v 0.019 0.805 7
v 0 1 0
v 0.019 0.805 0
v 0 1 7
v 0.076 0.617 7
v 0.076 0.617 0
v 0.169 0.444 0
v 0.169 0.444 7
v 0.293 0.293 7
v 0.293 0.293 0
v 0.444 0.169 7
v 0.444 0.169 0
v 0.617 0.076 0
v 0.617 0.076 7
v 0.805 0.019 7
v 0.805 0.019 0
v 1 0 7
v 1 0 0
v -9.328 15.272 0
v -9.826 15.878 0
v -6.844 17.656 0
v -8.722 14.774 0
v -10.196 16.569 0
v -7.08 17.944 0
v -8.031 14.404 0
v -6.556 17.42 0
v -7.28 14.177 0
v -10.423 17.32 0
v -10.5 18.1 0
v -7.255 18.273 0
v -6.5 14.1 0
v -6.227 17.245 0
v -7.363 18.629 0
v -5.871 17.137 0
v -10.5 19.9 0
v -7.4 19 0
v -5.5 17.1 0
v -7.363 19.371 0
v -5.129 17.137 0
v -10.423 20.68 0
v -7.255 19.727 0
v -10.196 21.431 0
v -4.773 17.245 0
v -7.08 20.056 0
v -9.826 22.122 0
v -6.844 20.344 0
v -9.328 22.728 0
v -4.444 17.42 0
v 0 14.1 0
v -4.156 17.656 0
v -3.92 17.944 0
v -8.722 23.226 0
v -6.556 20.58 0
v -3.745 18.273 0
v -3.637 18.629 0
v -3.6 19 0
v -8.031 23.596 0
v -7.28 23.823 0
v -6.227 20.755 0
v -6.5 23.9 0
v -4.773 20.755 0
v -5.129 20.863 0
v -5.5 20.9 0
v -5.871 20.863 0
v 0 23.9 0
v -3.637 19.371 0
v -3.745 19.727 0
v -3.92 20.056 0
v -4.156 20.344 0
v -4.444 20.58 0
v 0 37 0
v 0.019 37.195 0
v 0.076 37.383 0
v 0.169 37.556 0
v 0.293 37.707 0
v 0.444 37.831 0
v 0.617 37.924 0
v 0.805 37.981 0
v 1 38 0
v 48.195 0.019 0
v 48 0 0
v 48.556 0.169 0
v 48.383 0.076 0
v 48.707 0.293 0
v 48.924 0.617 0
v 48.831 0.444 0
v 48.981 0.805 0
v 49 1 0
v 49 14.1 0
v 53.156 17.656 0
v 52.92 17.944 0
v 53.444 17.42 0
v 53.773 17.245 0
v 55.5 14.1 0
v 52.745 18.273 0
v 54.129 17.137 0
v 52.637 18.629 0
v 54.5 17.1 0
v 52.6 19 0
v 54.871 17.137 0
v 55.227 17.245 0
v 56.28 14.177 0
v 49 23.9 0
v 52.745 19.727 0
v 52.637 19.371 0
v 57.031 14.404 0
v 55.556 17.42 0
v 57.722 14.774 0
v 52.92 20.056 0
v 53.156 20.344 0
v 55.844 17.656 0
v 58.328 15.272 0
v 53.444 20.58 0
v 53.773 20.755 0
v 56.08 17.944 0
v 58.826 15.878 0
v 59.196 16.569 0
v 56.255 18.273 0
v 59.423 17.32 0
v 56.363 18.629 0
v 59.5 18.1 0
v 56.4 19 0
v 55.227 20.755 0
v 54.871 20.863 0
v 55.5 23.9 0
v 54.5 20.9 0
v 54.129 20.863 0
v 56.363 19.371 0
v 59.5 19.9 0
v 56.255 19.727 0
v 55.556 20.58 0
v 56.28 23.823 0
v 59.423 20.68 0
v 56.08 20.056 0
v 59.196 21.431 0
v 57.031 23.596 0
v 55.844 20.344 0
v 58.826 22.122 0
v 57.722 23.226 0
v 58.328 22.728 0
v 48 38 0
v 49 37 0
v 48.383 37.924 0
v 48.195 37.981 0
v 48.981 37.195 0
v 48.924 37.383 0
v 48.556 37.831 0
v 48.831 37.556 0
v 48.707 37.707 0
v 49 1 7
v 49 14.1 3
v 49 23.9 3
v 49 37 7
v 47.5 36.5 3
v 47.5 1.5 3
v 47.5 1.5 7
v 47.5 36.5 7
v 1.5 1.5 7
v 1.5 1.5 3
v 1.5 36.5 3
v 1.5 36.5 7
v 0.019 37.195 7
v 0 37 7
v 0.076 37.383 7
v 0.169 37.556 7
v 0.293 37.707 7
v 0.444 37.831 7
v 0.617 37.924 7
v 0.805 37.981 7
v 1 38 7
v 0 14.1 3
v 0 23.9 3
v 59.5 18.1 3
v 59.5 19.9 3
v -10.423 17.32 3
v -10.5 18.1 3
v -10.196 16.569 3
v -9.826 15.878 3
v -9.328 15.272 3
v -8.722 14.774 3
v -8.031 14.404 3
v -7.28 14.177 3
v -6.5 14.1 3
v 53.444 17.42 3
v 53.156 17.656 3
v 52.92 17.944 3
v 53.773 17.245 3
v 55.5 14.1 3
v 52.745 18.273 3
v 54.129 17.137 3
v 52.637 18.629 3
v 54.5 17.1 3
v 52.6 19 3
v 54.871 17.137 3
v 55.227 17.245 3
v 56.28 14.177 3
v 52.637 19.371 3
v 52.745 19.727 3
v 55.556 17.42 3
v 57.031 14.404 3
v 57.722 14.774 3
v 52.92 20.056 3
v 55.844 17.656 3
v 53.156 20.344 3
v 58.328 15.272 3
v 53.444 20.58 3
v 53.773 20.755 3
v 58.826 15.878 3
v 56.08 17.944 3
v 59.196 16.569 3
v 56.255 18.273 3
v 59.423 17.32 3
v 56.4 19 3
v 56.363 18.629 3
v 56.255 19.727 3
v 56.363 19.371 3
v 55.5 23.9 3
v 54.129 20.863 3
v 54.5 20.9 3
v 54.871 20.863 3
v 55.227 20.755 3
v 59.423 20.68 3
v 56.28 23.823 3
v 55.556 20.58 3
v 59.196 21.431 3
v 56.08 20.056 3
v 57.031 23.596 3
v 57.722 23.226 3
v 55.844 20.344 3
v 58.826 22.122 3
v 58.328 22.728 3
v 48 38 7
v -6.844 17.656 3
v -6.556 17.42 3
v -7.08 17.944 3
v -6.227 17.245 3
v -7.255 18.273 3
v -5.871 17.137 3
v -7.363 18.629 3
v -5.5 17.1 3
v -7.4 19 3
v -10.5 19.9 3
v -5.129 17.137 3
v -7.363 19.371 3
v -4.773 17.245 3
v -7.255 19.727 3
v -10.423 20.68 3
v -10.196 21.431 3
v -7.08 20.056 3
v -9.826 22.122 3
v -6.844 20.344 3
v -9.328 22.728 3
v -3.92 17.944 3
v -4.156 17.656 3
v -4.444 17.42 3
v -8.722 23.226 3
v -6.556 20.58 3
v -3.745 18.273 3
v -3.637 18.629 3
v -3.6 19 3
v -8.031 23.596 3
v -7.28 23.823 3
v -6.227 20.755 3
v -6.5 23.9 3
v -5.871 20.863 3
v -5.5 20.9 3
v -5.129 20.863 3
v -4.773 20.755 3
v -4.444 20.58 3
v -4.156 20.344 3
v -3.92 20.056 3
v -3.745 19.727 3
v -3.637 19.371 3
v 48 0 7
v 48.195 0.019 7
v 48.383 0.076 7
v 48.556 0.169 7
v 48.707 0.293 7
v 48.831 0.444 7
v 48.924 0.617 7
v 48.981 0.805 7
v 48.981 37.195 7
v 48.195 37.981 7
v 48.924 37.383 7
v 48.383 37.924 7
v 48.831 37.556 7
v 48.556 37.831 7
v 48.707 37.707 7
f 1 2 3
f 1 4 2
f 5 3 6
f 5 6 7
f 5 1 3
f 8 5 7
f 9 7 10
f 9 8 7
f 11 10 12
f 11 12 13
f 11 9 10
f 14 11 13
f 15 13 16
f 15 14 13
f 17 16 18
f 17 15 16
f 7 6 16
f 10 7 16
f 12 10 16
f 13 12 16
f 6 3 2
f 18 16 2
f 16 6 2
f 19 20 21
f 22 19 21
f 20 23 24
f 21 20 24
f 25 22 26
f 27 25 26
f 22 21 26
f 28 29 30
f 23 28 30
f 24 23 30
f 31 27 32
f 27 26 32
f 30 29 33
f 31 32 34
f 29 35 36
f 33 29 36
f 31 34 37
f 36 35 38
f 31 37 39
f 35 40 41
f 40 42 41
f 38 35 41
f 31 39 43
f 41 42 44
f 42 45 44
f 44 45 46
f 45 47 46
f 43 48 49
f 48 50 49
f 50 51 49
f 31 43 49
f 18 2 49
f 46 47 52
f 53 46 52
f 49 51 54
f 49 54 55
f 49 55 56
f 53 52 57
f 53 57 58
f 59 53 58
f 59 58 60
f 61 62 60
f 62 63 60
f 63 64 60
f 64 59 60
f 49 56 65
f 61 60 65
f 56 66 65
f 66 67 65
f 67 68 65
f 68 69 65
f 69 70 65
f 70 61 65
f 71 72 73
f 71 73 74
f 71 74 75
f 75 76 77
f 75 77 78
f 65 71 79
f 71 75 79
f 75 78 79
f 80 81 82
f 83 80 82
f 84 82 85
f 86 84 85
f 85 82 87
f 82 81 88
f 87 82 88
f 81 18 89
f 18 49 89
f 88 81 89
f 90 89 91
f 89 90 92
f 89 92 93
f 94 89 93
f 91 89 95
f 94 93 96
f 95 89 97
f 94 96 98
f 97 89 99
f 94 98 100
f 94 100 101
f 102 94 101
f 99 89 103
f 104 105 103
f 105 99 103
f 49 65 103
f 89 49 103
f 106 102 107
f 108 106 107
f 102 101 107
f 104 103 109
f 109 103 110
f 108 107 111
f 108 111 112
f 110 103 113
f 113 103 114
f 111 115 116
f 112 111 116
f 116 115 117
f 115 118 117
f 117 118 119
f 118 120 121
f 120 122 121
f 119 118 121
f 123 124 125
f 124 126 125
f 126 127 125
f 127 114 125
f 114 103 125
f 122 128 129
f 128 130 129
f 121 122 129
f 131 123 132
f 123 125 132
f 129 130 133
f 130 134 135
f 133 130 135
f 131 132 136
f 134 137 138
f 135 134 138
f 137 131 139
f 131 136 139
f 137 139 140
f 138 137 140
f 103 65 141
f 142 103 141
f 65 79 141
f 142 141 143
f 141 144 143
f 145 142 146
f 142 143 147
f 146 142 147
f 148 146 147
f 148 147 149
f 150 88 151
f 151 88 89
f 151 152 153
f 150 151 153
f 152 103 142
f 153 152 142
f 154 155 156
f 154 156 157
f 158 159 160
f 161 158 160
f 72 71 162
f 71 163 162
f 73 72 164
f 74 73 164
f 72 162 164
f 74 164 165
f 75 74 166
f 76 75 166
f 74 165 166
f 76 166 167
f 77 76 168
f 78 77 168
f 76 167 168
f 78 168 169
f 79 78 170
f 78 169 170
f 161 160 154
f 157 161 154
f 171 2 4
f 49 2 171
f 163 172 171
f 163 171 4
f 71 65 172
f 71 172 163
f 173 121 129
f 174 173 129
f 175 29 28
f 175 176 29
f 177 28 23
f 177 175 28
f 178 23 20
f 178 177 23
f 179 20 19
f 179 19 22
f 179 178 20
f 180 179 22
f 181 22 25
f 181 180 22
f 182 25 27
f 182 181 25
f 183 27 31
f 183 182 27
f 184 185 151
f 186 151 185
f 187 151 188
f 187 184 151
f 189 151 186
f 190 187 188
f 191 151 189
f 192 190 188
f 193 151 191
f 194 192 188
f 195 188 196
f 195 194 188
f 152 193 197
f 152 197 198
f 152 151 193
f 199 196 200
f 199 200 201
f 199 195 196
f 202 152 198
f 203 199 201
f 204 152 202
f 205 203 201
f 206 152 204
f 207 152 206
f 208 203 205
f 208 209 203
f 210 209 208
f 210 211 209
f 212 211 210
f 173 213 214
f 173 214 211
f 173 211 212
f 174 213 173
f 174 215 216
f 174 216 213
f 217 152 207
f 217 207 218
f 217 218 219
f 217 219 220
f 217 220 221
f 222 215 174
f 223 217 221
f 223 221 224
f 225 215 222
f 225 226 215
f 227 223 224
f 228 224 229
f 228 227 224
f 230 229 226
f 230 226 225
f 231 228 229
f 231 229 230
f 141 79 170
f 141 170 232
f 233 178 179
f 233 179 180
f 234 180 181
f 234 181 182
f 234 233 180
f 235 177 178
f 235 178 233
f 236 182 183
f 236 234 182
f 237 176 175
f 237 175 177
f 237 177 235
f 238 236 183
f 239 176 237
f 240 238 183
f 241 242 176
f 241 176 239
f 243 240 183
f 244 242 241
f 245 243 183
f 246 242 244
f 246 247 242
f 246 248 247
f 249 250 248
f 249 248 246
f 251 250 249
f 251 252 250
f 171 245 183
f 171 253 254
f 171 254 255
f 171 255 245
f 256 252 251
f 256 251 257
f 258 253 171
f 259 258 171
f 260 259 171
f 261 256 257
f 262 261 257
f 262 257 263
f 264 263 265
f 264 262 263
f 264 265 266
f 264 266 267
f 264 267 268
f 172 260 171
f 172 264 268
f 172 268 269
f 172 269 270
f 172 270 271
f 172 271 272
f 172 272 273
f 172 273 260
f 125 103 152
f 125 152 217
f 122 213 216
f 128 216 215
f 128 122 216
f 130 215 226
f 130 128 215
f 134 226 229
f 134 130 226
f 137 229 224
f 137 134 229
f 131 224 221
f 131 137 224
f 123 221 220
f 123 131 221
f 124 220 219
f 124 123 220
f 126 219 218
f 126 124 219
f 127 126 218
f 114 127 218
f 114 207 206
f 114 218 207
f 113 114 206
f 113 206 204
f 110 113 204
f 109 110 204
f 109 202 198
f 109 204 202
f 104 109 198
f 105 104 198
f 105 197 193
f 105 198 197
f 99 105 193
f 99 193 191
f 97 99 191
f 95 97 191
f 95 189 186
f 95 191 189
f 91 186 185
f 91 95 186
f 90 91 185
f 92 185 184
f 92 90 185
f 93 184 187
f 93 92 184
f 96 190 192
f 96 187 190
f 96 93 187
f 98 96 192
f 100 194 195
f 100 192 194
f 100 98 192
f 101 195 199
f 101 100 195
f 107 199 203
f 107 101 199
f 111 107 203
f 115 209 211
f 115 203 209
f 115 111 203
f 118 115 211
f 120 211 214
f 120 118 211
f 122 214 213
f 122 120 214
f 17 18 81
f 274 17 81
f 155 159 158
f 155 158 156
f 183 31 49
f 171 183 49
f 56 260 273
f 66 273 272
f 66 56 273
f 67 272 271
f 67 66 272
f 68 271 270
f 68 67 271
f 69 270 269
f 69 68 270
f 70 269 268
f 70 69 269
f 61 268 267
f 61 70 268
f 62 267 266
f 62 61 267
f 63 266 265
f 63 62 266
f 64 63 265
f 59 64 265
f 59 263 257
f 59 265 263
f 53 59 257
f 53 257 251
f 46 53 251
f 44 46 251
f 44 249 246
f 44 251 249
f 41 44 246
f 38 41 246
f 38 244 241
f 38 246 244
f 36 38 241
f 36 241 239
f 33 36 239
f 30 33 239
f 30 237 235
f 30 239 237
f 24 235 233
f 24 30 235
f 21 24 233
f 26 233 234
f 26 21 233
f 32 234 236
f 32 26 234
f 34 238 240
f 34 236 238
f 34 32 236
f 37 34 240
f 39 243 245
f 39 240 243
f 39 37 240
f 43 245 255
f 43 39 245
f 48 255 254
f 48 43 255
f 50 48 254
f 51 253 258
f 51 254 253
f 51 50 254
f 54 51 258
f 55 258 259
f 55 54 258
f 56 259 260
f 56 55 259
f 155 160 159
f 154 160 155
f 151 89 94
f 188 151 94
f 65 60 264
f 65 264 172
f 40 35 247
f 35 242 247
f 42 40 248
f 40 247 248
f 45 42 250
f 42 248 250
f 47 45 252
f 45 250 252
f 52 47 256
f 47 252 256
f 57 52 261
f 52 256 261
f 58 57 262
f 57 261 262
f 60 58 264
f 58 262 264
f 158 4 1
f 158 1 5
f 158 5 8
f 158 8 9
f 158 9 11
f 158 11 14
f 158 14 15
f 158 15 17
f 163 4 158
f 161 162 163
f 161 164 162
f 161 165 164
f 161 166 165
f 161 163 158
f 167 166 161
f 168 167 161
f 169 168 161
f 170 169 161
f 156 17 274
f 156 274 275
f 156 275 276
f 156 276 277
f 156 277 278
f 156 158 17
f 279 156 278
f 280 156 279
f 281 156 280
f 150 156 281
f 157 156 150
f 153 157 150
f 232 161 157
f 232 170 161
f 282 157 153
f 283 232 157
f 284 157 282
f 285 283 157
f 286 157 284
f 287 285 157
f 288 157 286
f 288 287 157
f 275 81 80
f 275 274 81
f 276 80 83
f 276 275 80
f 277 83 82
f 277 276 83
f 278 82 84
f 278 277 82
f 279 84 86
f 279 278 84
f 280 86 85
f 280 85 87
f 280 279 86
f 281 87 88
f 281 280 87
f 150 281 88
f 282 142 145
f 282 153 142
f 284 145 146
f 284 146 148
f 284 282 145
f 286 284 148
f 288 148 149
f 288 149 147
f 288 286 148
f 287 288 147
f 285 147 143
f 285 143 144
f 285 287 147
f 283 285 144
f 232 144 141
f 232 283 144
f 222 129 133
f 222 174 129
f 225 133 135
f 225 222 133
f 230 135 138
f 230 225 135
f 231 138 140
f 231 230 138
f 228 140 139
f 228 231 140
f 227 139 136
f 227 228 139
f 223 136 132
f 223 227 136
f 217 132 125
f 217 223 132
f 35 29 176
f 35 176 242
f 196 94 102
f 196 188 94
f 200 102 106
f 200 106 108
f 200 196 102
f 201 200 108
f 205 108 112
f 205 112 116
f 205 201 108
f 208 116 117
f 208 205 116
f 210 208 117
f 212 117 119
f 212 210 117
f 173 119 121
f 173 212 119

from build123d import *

# Parameters (mm, degrees)
BOX001_W          = 46
BOX001_H          = 35
BOX001_DEPTH      = 4
BOX_W             = 49
BOX_H             = 38
BOX_DEPTH         = 7
FILLET_R          = 1
CYLINDER001_R     = 1.9
CYLINDER001_DEPTH = 10
ARRAY002_X_COUNT  = 2
ARRAY002_X_PITCH  = 60
BOX005_W          = 70
BOX005_H          = 9.8
BOX005_DEPTH      = 3
FILLET002_R       = 4


with BuildPart() as internal_cube:
    # Box001 → Box001 (new body)
    with BuildSketch(Plane(origin=(1.5, 1.5, 3), x_dir=(1, 0, 0), z_dir=(0, 0, 1))):
        with Locations((23, 17.5)):
            Rectangle(BOX001_W, BOX001_H)
    extrude(amount=BOX001_DEPTH)


with BuildPart() as external_fillet:
    # Box → Box (new body)
    with BuildSketch(Plane.XY):
        with Locations((24.5, 19)):
            Rectangle(BOX_W, BOX_H)
    extrude(amount=BOX_DEPTH)

    # Fillet
    fillet_edges = [external_fillet.edges().sort_by_distance(p)[0] for p in [
        (0, 0, 3.5),
        (0, 38, 3.5),
        (49, 0, 3.5),
        (49, 38, 3.5),
    ]]
    fillet(fillet_edges, radius=FILLET_R)


with BuildPart() as attach_hole_array:
    # Cylinder001 → Cylinder001 (new body)
    with BuildSketch(Plane(origin=(5, 4.9, 0), x_dir=(1, 0, 0), z_dir=(0, 0, 1))):
        Circle(CYLINDER001_R)
    extrude(amount=CYLINDER001_DEPTH)

    # Array002 X: attach hole array ×2


with BuildPart() as attach_hole_array_1:
    add(attach_hole_array.part)
    with Locations(*[(i * ARRAY002_X_PITCH, 0, 0) for i in range(1, ARRAY002_X_COUNT)]):
        add(attach_hole_array.part)


with BuildPart() as bread_board_cut:
    # Box005 → Box005 (new body)
    with BuildSketch(Plane.XY):
        with Locations((35, 4.9)):
            Rectangle(BOX005_W, BOX005_H)
    extrude(amount=BOX005_DEPTH)

    # Fillet002
    fillet002_edges = [bread_board_cut.edges().sort_by_distance(p)[0] for p in [
        (0, 0, 1.5),
        (0, 9.8, 1.5),
        (70, 0, 1.5),
        (70, 9.8, 1.5),
    ]]
    fillet(fillet002_edges, radius=FILLET002_R)

    # Cut002: cut attach hole array
    add(attach_hole_array_1.part, mode=Mode.SUBTRACT)


with BuildPart() as bread_board_cut_1:
    # Cut002 placement: moved
    add(bread_board_cut.part.moved(Location((-10.5, 14.1, 0))))

    # Fusion: union external fillet
    add(external_fillet.part)

    # Cut: cut internal cube
    add(internal_cube.part, mode=Mode.SUBTRACT)


solid = bread_board_cut_1.part
